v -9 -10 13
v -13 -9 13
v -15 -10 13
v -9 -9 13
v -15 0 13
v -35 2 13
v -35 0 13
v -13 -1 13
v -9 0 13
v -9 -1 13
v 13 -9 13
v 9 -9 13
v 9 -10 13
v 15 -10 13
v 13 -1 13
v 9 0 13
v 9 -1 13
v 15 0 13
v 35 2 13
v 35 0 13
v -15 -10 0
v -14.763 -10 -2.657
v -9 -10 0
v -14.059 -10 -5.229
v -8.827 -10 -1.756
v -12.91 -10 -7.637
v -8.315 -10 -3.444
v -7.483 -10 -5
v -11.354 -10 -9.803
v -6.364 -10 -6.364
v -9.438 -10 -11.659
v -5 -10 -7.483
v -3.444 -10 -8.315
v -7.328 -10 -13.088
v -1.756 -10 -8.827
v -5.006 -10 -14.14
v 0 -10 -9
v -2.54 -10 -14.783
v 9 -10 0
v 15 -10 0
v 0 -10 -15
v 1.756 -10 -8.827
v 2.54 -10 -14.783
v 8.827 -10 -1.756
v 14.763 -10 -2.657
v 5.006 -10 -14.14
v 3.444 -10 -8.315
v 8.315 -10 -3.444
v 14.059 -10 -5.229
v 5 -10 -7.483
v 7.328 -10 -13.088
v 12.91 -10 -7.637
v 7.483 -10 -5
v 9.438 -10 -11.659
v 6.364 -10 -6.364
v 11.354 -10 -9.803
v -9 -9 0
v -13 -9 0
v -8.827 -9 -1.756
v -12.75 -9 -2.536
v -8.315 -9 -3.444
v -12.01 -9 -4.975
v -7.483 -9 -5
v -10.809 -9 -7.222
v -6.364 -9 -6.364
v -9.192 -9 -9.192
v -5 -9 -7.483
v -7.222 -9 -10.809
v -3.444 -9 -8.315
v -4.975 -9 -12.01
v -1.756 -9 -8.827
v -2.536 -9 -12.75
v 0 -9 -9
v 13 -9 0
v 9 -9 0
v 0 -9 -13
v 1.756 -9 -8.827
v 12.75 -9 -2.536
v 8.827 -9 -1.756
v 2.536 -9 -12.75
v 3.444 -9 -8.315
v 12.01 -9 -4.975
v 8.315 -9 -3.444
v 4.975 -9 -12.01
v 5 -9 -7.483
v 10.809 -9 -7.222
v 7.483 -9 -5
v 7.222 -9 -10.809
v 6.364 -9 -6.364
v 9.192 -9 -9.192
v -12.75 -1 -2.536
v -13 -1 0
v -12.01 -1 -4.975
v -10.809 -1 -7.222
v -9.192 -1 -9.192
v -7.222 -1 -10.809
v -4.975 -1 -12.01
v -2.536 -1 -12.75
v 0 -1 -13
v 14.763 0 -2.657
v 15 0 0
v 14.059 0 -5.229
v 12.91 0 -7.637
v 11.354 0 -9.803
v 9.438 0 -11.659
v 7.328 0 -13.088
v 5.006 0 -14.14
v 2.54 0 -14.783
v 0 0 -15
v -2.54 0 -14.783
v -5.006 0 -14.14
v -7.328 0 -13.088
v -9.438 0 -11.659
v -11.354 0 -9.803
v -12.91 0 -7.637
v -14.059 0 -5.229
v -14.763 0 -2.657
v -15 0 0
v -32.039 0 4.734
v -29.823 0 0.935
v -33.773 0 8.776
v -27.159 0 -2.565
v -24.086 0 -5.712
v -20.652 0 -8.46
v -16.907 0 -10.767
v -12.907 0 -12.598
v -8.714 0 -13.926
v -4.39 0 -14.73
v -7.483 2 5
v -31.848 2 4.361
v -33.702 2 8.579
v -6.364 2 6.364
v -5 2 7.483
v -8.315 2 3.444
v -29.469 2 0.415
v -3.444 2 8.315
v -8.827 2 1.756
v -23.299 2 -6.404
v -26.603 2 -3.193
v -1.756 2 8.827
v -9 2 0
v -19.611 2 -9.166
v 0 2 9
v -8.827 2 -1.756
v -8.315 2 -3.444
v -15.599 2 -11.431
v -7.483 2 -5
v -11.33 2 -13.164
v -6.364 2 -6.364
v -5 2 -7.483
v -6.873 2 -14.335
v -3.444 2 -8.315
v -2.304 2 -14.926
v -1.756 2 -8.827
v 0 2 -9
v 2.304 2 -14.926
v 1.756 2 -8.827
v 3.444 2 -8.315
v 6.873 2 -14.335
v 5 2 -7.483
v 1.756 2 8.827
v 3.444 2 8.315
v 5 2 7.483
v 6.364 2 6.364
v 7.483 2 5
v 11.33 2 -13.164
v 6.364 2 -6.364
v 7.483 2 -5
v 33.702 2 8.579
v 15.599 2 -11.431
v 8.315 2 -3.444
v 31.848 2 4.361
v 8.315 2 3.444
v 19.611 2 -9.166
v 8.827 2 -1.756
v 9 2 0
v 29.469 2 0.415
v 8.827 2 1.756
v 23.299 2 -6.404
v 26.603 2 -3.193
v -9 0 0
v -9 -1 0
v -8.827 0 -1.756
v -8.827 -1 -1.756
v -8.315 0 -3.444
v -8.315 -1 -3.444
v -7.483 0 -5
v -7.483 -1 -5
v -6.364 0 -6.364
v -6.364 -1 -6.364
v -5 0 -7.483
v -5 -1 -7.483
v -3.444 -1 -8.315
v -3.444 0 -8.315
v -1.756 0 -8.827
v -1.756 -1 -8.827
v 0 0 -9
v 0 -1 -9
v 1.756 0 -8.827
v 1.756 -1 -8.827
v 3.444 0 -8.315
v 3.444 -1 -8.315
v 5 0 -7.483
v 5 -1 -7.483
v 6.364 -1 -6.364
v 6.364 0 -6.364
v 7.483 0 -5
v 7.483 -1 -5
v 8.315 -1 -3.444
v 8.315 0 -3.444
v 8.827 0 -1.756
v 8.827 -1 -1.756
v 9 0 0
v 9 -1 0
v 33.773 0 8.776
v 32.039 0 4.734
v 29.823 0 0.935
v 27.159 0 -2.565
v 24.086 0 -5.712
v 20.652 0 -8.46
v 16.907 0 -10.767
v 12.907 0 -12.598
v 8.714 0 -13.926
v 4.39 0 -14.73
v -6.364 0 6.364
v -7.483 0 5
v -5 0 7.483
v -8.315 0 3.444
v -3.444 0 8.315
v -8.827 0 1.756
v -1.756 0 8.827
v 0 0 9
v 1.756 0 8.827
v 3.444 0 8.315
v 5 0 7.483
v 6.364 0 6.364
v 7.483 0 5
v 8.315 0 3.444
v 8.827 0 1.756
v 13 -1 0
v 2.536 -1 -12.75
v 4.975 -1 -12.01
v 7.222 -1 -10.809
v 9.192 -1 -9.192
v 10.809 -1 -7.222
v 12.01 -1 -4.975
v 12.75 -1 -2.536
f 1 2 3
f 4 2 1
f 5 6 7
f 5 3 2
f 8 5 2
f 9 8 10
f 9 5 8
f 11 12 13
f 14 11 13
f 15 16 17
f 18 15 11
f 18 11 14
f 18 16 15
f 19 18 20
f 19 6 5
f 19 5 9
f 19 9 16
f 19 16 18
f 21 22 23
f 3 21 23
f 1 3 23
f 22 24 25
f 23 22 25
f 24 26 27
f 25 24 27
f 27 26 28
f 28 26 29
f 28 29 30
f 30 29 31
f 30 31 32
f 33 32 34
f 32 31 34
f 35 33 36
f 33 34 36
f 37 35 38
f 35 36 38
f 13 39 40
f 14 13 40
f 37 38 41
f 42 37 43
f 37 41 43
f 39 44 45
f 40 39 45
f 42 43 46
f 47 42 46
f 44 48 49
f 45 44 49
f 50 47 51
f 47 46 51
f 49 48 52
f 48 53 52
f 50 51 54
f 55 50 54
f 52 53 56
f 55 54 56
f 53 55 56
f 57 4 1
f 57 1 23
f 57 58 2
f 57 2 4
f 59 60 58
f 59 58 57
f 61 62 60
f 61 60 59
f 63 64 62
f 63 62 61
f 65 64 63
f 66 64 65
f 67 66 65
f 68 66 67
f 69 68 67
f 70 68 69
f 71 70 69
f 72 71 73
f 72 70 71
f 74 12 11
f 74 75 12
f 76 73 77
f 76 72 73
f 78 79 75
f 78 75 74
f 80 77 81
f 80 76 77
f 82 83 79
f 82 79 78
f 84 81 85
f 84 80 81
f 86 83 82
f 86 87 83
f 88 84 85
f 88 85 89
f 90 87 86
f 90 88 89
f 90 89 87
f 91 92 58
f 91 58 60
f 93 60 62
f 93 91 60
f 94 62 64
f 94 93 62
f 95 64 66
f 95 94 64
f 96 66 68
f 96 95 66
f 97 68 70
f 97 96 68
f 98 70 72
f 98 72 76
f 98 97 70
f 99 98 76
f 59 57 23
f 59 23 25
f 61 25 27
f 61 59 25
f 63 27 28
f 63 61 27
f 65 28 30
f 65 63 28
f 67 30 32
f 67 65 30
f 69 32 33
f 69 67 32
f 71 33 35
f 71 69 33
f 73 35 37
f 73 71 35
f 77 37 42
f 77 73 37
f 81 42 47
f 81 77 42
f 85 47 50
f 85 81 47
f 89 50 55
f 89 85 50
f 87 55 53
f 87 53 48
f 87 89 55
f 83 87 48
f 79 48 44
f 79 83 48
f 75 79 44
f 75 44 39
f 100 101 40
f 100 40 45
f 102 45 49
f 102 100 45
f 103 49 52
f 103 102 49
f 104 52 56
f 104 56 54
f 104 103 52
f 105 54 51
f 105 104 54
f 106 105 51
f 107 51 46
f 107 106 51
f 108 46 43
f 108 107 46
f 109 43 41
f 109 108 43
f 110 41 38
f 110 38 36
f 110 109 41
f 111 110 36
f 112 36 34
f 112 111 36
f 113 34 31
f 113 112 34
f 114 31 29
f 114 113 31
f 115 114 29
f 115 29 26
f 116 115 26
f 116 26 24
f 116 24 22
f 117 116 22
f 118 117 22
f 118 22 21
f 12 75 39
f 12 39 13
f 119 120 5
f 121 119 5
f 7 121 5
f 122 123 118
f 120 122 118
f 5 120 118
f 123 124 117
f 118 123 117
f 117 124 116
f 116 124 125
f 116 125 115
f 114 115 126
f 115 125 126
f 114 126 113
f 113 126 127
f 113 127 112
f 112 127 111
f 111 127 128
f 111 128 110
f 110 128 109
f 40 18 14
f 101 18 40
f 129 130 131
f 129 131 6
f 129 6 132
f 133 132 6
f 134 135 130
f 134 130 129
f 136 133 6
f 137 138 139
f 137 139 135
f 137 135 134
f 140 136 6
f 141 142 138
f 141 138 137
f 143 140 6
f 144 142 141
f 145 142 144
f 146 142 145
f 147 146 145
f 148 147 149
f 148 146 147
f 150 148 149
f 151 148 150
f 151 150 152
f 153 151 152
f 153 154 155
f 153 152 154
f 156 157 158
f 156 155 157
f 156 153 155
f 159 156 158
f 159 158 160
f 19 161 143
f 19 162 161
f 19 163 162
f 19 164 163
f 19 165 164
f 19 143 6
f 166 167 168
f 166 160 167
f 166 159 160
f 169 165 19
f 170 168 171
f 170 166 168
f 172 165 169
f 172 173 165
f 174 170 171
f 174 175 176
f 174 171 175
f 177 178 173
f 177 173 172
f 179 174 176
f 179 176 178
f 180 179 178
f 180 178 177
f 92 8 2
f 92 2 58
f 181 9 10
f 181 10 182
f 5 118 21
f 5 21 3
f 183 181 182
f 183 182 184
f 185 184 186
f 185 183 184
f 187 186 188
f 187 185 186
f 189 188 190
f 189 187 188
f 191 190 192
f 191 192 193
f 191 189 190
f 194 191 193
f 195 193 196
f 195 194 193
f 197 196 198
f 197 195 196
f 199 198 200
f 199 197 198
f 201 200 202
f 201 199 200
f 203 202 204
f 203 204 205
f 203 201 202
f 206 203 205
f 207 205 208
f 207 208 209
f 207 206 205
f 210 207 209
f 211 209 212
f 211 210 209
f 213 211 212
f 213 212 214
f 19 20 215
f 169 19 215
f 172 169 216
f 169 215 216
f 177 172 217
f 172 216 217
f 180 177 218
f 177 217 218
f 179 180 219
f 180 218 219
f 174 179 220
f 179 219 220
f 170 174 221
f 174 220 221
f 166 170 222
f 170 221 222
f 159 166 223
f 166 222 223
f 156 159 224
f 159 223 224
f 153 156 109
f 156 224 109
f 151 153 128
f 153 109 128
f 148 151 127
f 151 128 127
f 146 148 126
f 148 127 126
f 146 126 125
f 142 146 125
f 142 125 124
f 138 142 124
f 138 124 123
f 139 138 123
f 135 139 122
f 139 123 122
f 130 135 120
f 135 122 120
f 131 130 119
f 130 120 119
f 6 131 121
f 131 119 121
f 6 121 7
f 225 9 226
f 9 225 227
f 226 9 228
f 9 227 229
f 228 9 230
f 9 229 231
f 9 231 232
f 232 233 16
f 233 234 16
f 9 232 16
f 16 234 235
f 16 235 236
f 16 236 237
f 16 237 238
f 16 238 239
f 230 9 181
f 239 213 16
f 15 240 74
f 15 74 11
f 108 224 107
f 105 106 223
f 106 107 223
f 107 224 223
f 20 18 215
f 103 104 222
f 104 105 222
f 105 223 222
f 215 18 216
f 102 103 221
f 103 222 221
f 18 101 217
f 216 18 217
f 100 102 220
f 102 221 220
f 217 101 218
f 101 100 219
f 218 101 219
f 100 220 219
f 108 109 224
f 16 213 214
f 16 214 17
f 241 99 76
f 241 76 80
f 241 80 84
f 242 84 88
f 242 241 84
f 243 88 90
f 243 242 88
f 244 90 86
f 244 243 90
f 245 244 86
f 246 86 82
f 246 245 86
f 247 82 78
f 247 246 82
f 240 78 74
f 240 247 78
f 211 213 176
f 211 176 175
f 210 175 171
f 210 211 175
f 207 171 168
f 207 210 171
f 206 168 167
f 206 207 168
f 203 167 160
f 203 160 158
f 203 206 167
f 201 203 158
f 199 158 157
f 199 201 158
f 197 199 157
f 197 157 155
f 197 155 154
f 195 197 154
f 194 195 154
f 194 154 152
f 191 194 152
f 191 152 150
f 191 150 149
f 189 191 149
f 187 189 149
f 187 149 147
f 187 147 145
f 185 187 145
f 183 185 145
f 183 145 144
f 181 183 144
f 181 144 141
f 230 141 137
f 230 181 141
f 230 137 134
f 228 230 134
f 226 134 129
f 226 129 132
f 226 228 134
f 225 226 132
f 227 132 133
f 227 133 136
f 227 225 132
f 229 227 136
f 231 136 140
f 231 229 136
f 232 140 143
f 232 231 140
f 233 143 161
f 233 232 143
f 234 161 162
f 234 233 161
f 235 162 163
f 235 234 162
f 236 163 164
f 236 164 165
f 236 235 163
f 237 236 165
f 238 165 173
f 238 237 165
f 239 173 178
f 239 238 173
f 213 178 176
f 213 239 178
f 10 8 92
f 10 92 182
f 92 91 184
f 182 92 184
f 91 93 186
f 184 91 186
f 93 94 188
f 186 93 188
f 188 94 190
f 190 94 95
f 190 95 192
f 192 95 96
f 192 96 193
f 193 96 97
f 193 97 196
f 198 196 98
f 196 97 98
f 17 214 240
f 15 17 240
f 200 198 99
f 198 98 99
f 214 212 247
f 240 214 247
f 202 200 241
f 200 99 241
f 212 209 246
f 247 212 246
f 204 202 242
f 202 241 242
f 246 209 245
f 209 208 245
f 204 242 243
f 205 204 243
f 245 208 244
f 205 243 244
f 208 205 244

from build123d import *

# Parameters (mm, degrees)
SKETCH1_R           = 9
BOSS_EXTRUDE1_DEPTH = 2
BOSS_EXTRUDE3_DEPTH = 9
BOSS_EXTRUDE4_DEPTH = 1
BOSS_EXTRUDE5_START = -9
BOSS_EXTRUDE5_DEPTH = 1


with BuildPart() as part:
    # Sketch1 → Boss-Extrude1 (new body)
    with BuildSketch(Plane(origin=(0, 0, 0), x_dir=(1, 0, 0), z_dir=(0, 1, 0))):
        with BuildLine():
            Line((-35, -13), (35, -13))
            ThreePointArc((35, -13), (0, 15), (-35, -13))
        make_face()
        Circle(SKETCH1_R, mode=Mode.SUBTRACT)
    extrude(amount=BOSS_EXTRUDE1_DEPTH)

    # Sketch1<5> → Boss-Extrude3 (add)
    with BuildSketch(Plane(origin=(0, 0, 0), x_dir=(1, 0, 0), z_dir=(0, 1, 0))):
        with BuildLine():
            ThreePointArc((9.437961603, 11.658682635), (4.766399393, 12.662994302), (6.3e-08, 13))
            ThreePointArc((6.3e-08, 13), (9.192388178, 9.192388133), (13, 0))
            Line((13, 0), (13, -13))
            Line((13, -13), (15, -13))
            Line((15, -13), (15, 0))
            ThreePointArc((15, 0), (13.538268428, 6.458737336), (9.437961603, 11.658682635))
        make_face()
        with BuildLine():
            ThreePointArc((-9.437961603, 11.658682635), (-4.76639933, 12.662994311), (6.3e-08, 13))
            ThreePointArc((6.3e-08, 13), (4.766399393, 12.662994302), (9.437961603, 11.658682635))
            ThreePointArc((9.437961603, 11.658682635), (5.005984494, 14.140018361), (1.09e-07, 15))
            ThreePointArc((1.09e-07, 15), (-5.005984391, 14.140018397), (-9.437961603, 11.658682635))
        make_face()
        with BuildLine():
            Line((-13, -13), (-13, 0))
            ThreePointArc((-13, 0), (-9.192388133, 9.192388178), (6.3e-08, 13))
            ThreePointArc((6.3e-08, 13), (-4.76639933, 12.662994311), (-9.437961603, 11.658682635))
            ThreePointArc((-9.437961603, 11.658682635), (-13.538268428, 6.458737336), (-15, 0))
            Line((-15, 0), (-15, -13))
            Line((-15, -13), (-13, -13))
        make_face()
    extrude(amount=-BOSS_EXTRUDE3_DEPTH)

    # Sketch1<6> → Boss-Extrude4 (add)
    with BuildSketch(Plane(origin=(0, 0, 0), x_dir=(1, 0, 0), z_dir=(0, 1, 0))):
        with BuildLine():
            ThreePointArc((6.3e-08, 13), (-9.192388133, 9.192388178), (-13, 0))
            Line((-13, 0), (-13, -13))
            Line((-13, -13), (-9, -13))
            Line((-9, -13), (-9, 0))
            ThreePointArc((-9, 0), (0, 9), (9, 0))
            Line((9, 0), (9, -13))
            Line((9, -13), (13, -13))
            Line((13, -13), (13, 0))
            ThreePointArc((13, 0), (9.192388178, 9.192388133), (6.3e-08, 13))
        make_face()
    extrude(amount=-BOSS_EXTRUDE4_DEPTH)

    # Sketch1<7> → Boss-Extrude5 (add)
    with BuildSketch(Plane(origin=(0, 0, 0), x_dir=(1, 0, 0), z_dir=(0, 1, 0)).offset(BOSS_EXTRUDE5_START)):
        with BuildLine():
            Line((-13, -13), (-13, 0))
            ThreePointArc((-13, 0), (-9.192388133, 9.192388178), (6.3e-08, 13))
            ThreePointArc((6.3e-08, 13), (-4.76639933, 12.662994311), (-9.437961603, 11.658682635))
            ThreePointArc((-9.437961603, 11.658682635), (-13.538268428, 6.458737336), (-15, 0))
            Line((-15, 0), (-15, -13))
            Line((-15, -13), (-13, -13))
        make_face()
        with BuildLine():
            ThreePointArc((-9.437961603, 11.658682635), (-4.76639933, 12.662994311), (6.3e-08, 13))
            ThreePointArc((6.3e-08, 13), (4.766399393, 12.662994302), (9.437961603, 11.658682635))
            ThreePointArc((9.437961603, 11.658682635), (5.005984494, 14.140018361), (1.09e-07, 15))
            ThreePointArc((1.09e-07, 15), (-5.005984391, 14.140018397), (-9.437961603, 11.658682635))
        make_face()
        with BuildLine():
            ThreePointArc((9.437961603, 11.658682635), (4.766399393, 12.662994302), (6.3e-08, 13))
            ThreePointArc((6.3e-08, 13), (9.192388178, 9.192388133), (13, 0))
            Line((13, 0), (13, -13))
            Line((13, -13), (15, -13))
            Line((15, -13), (15, 0))
            ThreePointArc((15, 0), (13.538268428, 6.458737336), (9.437961603, 11.658682635))
        make_face()
        with BuildLine():
            ThreePointArc((6.3e-08, 13), (-9.192388133, 9.192388178), (-13, 0))
            Line((-13, 0), (-13, -13))
            Line((-13, -13), (-9, -13))
            Line((-9, -13), (-9, 0))
            ThreePointArc((-9, 0), (0, 9), (9, 0))
            Line((9, 0), (9, -13))
            Line((9, -13), (13, -13))
            Line((13, -13), (13, 0))
            ThreePointArc((13, 0), (9.192388178, 9.192388133), (6.3e-08, 13))
        make_face()
    extrude(amount=-BOSS_EXTRUDE5_DEPTH)


solid = part.part
